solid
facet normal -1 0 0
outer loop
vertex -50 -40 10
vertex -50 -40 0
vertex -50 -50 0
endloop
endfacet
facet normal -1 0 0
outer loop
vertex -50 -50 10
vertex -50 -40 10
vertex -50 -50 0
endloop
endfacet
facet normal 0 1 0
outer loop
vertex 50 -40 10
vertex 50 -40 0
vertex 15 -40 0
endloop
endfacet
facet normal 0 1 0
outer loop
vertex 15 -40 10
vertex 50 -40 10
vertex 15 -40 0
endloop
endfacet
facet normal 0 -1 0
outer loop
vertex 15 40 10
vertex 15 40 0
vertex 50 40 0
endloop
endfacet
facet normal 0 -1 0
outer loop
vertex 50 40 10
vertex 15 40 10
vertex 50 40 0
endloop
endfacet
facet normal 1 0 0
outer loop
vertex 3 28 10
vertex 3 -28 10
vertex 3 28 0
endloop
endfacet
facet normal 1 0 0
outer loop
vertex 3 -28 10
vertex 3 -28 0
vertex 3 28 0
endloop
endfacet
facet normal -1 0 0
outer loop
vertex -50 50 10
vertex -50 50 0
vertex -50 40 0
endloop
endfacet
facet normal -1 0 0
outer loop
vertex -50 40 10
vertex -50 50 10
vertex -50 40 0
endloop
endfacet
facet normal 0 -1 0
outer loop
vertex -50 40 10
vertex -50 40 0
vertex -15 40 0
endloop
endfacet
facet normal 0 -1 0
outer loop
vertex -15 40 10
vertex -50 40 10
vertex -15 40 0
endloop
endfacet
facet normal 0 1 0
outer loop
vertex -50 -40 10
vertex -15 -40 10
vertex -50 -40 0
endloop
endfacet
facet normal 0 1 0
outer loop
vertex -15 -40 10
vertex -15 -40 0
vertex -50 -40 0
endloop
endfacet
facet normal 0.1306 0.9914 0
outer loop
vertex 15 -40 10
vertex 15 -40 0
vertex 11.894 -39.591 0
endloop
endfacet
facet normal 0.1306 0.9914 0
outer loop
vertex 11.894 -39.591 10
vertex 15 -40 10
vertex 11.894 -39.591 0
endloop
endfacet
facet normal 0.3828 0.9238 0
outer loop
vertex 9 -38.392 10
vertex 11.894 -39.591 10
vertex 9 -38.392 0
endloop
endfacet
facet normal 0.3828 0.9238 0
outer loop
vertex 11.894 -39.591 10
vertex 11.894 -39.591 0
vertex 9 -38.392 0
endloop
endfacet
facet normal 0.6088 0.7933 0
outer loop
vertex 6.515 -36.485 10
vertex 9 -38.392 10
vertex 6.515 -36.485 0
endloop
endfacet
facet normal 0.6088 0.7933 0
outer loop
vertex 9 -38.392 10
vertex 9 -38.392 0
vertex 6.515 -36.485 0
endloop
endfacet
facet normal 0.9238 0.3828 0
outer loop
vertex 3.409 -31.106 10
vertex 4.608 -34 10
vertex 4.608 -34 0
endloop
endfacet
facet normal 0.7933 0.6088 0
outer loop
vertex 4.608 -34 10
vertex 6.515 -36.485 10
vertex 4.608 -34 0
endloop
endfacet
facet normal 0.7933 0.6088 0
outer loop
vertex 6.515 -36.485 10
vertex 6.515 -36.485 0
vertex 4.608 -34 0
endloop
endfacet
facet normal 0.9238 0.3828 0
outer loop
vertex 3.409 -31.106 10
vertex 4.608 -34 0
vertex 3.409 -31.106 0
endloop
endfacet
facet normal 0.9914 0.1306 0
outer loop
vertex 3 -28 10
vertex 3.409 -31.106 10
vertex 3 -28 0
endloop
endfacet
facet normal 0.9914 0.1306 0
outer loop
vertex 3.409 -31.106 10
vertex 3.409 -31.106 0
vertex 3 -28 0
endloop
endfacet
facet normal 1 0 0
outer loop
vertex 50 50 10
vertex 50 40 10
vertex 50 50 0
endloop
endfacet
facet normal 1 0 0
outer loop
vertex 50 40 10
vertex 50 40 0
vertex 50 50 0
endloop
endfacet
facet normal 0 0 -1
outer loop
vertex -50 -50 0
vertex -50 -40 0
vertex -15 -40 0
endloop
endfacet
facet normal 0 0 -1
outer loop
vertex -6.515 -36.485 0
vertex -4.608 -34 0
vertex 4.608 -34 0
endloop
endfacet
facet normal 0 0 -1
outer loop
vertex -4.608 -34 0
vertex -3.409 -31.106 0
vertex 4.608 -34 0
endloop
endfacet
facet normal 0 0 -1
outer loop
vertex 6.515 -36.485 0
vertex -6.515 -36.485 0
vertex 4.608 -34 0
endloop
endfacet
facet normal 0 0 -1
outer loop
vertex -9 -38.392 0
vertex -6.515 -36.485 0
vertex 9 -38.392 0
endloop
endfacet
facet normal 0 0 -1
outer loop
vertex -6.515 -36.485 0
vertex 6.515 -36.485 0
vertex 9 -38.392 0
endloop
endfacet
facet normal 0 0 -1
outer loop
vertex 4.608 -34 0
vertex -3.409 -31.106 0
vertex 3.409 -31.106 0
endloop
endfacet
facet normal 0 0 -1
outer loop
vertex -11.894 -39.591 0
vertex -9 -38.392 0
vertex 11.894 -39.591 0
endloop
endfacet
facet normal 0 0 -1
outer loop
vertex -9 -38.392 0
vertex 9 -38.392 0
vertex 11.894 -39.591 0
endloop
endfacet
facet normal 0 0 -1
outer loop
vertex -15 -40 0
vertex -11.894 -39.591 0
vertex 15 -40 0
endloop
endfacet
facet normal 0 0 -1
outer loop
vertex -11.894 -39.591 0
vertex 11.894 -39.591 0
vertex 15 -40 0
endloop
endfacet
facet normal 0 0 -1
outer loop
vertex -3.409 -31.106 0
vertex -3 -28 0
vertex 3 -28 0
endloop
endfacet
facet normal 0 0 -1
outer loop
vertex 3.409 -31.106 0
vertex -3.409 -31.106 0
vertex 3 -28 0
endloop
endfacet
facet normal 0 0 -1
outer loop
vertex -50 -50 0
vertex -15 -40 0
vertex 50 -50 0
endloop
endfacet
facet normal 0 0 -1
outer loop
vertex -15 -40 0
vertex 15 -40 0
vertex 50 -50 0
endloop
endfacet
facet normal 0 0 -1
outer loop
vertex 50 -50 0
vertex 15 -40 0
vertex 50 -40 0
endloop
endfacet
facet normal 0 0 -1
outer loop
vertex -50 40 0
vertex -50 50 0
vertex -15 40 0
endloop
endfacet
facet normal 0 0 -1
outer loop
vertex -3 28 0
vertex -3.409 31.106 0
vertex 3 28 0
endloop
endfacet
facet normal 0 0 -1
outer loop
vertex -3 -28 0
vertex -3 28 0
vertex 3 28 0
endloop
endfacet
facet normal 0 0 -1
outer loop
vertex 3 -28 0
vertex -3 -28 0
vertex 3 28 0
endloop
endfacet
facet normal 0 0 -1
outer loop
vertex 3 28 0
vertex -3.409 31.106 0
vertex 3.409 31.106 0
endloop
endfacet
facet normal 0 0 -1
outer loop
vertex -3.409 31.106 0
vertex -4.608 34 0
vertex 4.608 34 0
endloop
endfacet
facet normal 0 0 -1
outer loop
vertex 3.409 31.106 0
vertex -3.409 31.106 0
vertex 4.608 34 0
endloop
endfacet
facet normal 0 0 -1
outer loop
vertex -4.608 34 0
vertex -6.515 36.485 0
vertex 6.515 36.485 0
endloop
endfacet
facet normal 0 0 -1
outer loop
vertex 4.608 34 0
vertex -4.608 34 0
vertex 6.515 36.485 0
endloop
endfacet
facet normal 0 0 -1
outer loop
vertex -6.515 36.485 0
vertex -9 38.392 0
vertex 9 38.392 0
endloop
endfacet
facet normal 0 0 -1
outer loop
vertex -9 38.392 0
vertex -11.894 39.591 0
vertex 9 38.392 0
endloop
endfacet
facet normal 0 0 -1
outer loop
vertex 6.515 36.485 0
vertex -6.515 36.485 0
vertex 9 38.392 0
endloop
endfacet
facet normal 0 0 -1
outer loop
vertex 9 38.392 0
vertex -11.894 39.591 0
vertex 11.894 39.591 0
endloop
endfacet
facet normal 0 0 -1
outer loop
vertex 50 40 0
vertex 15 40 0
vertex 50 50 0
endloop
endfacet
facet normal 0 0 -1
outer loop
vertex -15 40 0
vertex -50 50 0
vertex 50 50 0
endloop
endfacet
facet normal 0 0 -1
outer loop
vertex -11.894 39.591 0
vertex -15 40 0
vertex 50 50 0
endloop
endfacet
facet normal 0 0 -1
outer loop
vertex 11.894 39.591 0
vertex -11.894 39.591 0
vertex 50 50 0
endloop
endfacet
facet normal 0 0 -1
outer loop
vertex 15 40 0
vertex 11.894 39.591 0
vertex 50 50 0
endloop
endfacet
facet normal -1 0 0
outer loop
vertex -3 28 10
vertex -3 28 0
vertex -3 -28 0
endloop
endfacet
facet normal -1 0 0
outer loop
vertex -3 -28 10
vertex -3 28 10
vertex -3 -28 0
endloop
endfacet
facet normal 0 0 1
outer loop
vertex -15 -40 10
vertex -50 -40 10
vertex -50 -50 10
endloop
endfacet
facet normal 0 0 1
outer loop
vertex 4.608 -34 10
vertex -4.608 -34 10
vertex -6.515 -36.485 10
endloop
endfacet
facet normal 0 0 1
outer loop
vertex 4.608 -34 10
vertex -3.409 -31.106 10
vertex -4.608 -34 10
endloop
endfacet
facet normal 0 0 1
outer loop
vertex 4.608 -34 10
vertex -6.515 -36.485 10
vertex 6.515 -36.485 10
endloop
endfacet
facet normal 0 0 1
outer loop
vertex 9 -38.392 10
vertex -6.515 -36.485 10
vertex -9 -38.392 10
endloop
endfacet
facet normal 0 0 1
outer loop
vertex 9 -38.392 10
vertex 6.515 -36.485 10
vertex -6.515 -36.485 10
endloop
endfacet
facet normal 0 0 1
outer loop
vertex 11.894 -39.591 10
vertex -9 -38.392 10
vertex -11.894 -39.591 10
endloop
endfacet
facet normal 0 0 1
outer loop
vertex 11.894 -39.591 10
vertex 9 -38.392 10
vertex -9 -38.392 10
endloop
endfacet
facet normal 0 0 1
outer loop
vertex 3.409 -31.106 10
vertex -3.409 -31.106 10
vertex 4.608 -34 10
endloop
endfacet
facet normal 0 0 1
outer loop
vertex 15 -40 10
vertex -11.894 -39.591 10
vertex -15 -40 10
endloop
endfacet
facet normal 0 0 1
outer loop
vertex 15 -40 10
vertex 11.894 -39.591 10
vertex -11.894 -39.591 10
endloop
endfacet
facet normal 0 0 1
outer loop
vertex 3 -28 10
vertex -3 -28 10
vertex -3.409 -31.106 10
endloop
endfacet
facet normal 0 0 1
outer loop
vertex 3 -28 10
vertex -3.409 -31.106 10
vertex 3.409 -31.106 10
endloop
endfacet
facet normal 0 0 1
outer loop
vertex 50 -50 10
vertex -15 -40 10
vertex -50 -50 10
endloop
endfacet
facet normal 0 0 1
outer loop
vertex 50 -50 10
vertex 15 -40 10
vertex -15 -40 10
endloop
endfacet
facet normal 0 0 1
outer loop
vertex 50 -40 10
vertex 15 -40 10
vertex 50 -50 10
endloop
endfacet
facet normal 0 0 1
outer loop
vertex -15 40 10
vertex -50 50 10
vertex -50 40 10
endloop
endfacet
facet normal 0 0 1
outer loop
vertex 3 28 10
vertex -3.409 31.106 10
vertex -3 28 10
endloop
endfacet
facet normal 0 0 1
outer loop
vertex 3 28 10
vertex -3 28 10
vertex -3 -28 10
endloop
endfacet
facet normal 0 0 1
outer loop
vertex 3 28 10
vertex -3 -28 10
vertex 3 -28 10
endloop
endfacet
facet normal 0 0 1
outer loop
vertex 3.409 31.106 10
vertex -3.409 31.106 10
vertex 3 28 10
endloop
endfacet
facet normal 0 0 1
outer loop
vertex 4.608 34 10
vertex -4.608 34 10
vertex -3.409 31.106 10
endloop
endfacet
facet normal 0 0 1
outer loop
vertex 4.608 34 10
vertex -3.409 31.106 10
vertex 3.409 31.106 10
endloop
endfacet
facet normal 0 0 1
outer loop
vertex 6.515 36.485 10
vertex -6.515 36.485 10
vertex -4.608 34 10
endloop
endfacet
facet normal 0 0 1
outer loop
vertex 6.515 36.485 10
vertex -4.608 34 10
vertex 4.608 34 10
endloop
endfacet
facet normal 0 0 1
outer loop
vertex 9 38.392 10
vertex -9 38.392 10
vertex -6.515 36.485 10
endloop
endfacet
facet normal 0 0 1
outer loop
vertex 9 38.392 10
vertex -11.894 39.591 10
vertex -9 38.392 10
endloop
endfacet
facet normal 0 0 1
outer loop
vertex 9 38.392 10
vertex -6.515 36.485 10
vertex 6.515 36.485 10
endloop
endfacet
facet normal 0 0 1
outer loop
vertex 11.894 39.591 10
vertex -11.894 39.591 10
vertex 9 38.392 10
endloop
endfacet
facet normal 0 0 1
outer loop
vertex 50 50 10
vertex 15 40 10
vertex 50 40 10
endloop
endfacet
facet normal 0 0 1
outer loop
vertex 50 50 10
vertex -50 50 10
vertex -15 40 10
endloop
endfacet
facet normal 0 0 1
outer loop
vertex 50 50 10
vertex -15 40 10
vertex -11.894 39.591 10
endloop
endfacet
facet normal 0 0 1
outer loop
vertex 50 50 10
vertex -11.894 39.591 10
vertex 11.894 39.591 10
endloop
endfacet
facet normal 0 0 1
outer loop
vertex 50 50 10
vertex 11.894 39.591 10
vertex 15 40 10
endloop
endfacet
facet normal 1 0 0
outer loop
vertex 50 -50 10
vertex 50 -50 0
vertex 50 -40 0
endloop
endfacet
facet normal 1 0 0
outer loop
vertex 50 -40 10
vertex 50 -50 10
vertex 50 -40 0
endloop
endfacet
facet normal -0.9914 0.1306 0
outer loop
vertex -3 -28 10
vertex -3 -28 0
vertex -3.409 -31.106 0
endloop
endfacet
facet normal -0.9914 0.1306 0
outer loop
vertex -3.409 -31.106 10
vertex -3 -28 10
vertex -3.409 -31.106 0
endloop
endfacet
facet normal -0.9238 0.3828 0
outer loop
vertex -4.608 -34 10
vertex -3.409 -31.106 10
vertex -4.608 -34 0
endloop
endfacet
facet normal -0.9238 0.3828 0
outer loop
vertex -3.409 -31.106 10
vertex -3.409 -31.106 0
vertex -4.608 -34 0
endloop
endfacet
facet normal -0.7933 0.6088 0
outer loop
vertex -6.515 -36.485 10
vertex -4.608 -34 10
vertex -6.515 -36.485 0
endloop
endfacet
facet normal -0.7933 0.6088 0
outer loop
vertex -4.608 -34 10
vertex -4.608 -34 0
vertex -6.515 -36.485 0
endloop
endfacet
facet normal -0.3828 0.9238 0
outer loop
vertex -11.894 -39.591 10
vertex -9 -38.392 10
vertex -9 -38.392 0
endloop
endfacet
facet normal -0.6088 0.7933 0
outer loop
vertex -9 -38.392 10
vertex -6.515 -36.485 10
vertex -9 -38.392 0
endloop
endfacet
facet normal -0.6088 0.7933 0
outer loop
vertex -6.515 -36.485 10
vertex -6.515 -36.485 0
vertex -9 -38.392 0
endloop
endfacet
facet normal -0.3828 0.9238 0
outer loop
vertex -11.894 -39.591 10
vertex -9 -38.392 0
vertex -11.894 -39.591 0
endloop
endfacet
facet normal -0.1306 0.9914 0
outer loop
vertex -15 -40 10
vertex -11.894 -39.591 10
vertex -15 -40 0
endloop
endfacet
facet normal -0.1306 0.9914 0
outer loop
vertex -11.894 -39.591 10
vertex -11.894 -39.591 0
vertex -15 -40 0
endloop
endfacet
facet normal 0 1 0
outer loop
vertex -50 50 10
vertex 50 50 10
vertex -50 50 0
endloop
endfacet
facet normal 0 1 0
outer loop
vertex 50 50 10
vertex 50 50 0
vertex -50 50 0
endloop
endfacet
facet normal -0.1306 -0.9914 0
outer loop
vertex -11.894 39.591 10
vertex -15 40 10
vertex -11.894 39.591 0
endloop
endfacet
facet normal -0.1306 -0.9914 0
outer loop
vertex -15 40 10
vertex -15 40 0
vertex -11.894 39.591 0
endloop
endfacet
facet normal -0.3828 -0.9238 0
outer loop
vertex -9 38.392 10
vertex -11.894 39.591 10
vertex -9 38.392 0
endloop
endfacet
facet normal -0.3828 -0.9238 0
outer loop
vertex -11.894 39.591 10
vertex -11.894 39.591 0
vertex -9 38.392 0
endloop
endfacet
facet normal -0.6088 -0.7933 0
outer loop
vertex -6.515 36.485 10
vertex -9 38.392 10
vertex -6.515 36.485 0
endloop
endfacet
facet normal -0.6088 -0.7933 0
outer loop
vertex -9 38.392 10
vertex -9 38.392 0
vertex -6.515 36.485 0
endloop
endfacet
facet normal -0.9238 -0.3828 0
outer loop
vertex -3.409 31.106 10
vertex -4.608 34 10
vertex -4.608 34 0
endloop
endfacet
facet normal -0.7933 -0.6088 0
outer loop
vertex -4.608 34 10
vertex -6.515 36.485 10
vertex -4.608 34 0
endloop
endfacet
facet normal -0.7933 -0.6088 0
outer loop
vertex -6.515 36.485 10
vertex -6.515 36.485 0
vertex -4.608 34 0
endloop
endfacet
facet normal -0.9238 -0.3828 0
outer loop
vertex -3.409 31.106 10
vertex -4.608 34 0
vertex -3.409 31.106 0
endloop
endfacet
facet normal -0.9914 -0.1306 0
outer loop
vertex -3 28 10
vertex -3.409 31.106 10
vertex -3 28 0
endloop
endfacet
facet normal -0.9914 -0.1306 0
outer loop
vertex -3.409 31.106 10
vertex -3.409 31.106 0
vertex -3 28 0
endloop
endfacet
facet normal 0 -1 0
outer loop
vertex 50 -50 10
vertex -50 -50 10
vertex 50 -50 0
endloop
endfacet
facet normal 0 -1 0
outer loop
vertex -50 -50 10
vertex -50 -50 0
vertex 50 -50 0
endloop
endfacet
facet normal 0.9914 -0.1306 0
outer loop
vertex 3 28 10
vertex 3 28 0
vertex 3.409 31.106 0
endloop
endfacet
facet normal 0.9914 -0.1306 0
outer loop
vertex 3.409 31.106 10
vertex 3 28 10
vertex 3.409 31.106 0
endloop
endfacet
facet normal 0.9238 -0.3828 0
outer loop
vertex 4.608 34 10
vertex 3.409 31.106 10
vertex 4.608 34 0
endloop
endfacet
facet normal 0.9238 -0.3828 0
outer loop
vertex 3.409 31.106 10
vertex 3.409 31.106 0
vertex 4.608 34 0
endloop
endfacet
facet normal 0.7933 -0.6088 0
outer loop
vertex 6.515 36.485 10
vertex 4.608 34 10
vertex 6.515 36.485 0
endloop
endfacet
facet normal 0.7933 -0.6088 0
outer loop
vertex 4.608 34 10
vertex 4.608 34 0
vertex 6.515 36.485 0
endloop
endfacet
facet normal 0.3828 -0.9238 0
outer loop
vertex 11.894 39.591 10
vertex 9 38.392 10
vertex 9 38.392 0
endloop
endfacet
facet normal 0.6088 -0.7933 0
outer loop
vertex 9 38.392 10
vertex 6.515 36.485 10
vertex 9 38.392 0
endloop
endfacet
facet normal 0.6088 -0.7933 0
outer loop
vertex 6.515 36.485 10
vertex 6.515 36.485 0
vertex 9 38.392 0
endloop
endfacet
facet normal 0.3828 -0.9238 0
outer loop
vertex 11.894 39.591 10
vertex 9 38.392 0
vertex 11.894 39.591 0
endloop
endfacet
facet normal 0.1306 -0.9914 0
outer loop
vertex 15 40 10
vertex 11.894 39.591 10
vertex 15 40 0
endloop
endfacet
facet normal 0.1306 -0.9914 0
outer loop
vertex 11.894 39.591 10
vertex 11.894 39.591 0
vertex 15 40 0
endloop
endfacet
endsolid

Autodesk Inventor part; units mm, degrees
ref_plane "YZ Plane" through (0, 0, 0) normal (1, 0, 0) x (0, 1, 0)
ref_plane "XZ Plane" through (0, 0, 0) normal (0, 1, 0) x (-1, 0, 0)
ref_plane "XY Plane" through (0, 0, 0) normal (0, 0, 1) x (1, 0, 0)
sketch "Блок1" plane through (0, 0, 0) normal (0, 0, 1) x (1, 0, 0)
  line L0 (-15, -40) -> (-50, -40)
  line L1 (-50, -40) -> (-50, -50)
  arc A0 (-15, -40) -> (-3, -28) centre (-15, -28) ccw
  arc A1 (3, -28) -> (15, -40) centre (15, -28) ccw
  line L2 (50, -40) -> (15, -40)
  line L3 (-50, -50) -> (50, -50)
  line L4 (15, 40) -> (50, 40)
  line L5 (50, 50) -> (-50, 50)
  line L6 (50, 40) -> (50, 50)
  line L7 (3, -28) -> (3, 28)
  line L8 (-3, 28) -> (-3, -28)
  line L9 (-50, 40) -> (-15, 40)
  arc A2 (-3, 28) -> (-15, 40) centre (-15, 28) ccw
  arc A3 (15, 40) -> (3, 28) centre (15, 28) ccw
  line L10 (-50, 50) -> (-50, 40)
  line L11 (50, -50) -> (50, -40)
  line L12 (-3, 0) -> (3, 0) construction
  point P0 (0, 0)
  point P1 (3, 40)
  point P2 (-3, 40)
  point P3 (0, 0)
  dimension "d12" = 100
  dimension "d13" = 100
  dimension "d14" = 6
  dimension "d15" = 10
  dimension "d16" = 12
sketch "Эскиз1" plane through (0, 0, 0) normal (0, 0, 1) x (1, 0, 0)
  line L0 (-3, 0) -> (3, 0) construction
  line L1 (-50, 40) -> (-15, 40)
  line L2 (-50, 50) -> (-50, 40)
  line L3 (50, 50) -> (-50, 50)
  line L4 (50, 40) -> (50, 50)
  line L5 (15, 40) -> (50, 40)
  line L6 (3, -28) -> (3, 28)
  line L7 (50, -40) -> (15, -40)
  line L8 (50, -50) -> (50, -40)
  line L9 (-50, -40) -> (-50, -50)
  line L10 (-15, -40) -> (-50, -40)
  line L11 (-3, 28) -> (-3, -28)
  arc A0 (-15, -40) -> (-3, -28) centre (-15, -28) ccw
  arc A1 (-3, 28) -> (-15, 40) centre (-15, 28) ccw
  arc A2 (15, 40) -> (3, 28) centre (15, 28) ccw
  arc A3 (3, -28) -> (15, -40) centre (15, -28) ccw
  line L12 (-50, -50) -> (50, -50)
  line L13 (0, 0) -> (0, 10) construction
  point P0 (-3, 40)
  point P1 (3, 40)
  dimension "d63" = 100
  dimension "d64" = 100
  dimension "d65" = 6
  dimension "d66" = 10
  dimension "d67" = 12
  dimension "d126" = 10
  dimension "d127" = 90
extrude "Выдавливание5" add sketch "Эскиз1" along normal blind 10
equation "\"d12\" = ParH"
equation "\"d13\" = b"
equation "\"d14\" = t1"
equation "\"d15\" = t2"
equation "\"d16\" = R1"
equation "\"d63\" = ParH"
equation "\"d64\" = b"
equation "\"d65\" = t1"
equation "\"d66\" = t2"
equation "\"d67\" = R1"
equation "\"ParH\" = 100"
equation "\"b\" = 100"
equation "\"t1\" = 6"
equation "\"t2\" = 10"
equation "\"R1\" = 12"
equation "\"Height\" = 96"
equation "\"Thickness1\" = 5"
equation "\"Thickness2\" = 8"
properties part number "IPB" material "Ст3сп ДСТУ 2651"
